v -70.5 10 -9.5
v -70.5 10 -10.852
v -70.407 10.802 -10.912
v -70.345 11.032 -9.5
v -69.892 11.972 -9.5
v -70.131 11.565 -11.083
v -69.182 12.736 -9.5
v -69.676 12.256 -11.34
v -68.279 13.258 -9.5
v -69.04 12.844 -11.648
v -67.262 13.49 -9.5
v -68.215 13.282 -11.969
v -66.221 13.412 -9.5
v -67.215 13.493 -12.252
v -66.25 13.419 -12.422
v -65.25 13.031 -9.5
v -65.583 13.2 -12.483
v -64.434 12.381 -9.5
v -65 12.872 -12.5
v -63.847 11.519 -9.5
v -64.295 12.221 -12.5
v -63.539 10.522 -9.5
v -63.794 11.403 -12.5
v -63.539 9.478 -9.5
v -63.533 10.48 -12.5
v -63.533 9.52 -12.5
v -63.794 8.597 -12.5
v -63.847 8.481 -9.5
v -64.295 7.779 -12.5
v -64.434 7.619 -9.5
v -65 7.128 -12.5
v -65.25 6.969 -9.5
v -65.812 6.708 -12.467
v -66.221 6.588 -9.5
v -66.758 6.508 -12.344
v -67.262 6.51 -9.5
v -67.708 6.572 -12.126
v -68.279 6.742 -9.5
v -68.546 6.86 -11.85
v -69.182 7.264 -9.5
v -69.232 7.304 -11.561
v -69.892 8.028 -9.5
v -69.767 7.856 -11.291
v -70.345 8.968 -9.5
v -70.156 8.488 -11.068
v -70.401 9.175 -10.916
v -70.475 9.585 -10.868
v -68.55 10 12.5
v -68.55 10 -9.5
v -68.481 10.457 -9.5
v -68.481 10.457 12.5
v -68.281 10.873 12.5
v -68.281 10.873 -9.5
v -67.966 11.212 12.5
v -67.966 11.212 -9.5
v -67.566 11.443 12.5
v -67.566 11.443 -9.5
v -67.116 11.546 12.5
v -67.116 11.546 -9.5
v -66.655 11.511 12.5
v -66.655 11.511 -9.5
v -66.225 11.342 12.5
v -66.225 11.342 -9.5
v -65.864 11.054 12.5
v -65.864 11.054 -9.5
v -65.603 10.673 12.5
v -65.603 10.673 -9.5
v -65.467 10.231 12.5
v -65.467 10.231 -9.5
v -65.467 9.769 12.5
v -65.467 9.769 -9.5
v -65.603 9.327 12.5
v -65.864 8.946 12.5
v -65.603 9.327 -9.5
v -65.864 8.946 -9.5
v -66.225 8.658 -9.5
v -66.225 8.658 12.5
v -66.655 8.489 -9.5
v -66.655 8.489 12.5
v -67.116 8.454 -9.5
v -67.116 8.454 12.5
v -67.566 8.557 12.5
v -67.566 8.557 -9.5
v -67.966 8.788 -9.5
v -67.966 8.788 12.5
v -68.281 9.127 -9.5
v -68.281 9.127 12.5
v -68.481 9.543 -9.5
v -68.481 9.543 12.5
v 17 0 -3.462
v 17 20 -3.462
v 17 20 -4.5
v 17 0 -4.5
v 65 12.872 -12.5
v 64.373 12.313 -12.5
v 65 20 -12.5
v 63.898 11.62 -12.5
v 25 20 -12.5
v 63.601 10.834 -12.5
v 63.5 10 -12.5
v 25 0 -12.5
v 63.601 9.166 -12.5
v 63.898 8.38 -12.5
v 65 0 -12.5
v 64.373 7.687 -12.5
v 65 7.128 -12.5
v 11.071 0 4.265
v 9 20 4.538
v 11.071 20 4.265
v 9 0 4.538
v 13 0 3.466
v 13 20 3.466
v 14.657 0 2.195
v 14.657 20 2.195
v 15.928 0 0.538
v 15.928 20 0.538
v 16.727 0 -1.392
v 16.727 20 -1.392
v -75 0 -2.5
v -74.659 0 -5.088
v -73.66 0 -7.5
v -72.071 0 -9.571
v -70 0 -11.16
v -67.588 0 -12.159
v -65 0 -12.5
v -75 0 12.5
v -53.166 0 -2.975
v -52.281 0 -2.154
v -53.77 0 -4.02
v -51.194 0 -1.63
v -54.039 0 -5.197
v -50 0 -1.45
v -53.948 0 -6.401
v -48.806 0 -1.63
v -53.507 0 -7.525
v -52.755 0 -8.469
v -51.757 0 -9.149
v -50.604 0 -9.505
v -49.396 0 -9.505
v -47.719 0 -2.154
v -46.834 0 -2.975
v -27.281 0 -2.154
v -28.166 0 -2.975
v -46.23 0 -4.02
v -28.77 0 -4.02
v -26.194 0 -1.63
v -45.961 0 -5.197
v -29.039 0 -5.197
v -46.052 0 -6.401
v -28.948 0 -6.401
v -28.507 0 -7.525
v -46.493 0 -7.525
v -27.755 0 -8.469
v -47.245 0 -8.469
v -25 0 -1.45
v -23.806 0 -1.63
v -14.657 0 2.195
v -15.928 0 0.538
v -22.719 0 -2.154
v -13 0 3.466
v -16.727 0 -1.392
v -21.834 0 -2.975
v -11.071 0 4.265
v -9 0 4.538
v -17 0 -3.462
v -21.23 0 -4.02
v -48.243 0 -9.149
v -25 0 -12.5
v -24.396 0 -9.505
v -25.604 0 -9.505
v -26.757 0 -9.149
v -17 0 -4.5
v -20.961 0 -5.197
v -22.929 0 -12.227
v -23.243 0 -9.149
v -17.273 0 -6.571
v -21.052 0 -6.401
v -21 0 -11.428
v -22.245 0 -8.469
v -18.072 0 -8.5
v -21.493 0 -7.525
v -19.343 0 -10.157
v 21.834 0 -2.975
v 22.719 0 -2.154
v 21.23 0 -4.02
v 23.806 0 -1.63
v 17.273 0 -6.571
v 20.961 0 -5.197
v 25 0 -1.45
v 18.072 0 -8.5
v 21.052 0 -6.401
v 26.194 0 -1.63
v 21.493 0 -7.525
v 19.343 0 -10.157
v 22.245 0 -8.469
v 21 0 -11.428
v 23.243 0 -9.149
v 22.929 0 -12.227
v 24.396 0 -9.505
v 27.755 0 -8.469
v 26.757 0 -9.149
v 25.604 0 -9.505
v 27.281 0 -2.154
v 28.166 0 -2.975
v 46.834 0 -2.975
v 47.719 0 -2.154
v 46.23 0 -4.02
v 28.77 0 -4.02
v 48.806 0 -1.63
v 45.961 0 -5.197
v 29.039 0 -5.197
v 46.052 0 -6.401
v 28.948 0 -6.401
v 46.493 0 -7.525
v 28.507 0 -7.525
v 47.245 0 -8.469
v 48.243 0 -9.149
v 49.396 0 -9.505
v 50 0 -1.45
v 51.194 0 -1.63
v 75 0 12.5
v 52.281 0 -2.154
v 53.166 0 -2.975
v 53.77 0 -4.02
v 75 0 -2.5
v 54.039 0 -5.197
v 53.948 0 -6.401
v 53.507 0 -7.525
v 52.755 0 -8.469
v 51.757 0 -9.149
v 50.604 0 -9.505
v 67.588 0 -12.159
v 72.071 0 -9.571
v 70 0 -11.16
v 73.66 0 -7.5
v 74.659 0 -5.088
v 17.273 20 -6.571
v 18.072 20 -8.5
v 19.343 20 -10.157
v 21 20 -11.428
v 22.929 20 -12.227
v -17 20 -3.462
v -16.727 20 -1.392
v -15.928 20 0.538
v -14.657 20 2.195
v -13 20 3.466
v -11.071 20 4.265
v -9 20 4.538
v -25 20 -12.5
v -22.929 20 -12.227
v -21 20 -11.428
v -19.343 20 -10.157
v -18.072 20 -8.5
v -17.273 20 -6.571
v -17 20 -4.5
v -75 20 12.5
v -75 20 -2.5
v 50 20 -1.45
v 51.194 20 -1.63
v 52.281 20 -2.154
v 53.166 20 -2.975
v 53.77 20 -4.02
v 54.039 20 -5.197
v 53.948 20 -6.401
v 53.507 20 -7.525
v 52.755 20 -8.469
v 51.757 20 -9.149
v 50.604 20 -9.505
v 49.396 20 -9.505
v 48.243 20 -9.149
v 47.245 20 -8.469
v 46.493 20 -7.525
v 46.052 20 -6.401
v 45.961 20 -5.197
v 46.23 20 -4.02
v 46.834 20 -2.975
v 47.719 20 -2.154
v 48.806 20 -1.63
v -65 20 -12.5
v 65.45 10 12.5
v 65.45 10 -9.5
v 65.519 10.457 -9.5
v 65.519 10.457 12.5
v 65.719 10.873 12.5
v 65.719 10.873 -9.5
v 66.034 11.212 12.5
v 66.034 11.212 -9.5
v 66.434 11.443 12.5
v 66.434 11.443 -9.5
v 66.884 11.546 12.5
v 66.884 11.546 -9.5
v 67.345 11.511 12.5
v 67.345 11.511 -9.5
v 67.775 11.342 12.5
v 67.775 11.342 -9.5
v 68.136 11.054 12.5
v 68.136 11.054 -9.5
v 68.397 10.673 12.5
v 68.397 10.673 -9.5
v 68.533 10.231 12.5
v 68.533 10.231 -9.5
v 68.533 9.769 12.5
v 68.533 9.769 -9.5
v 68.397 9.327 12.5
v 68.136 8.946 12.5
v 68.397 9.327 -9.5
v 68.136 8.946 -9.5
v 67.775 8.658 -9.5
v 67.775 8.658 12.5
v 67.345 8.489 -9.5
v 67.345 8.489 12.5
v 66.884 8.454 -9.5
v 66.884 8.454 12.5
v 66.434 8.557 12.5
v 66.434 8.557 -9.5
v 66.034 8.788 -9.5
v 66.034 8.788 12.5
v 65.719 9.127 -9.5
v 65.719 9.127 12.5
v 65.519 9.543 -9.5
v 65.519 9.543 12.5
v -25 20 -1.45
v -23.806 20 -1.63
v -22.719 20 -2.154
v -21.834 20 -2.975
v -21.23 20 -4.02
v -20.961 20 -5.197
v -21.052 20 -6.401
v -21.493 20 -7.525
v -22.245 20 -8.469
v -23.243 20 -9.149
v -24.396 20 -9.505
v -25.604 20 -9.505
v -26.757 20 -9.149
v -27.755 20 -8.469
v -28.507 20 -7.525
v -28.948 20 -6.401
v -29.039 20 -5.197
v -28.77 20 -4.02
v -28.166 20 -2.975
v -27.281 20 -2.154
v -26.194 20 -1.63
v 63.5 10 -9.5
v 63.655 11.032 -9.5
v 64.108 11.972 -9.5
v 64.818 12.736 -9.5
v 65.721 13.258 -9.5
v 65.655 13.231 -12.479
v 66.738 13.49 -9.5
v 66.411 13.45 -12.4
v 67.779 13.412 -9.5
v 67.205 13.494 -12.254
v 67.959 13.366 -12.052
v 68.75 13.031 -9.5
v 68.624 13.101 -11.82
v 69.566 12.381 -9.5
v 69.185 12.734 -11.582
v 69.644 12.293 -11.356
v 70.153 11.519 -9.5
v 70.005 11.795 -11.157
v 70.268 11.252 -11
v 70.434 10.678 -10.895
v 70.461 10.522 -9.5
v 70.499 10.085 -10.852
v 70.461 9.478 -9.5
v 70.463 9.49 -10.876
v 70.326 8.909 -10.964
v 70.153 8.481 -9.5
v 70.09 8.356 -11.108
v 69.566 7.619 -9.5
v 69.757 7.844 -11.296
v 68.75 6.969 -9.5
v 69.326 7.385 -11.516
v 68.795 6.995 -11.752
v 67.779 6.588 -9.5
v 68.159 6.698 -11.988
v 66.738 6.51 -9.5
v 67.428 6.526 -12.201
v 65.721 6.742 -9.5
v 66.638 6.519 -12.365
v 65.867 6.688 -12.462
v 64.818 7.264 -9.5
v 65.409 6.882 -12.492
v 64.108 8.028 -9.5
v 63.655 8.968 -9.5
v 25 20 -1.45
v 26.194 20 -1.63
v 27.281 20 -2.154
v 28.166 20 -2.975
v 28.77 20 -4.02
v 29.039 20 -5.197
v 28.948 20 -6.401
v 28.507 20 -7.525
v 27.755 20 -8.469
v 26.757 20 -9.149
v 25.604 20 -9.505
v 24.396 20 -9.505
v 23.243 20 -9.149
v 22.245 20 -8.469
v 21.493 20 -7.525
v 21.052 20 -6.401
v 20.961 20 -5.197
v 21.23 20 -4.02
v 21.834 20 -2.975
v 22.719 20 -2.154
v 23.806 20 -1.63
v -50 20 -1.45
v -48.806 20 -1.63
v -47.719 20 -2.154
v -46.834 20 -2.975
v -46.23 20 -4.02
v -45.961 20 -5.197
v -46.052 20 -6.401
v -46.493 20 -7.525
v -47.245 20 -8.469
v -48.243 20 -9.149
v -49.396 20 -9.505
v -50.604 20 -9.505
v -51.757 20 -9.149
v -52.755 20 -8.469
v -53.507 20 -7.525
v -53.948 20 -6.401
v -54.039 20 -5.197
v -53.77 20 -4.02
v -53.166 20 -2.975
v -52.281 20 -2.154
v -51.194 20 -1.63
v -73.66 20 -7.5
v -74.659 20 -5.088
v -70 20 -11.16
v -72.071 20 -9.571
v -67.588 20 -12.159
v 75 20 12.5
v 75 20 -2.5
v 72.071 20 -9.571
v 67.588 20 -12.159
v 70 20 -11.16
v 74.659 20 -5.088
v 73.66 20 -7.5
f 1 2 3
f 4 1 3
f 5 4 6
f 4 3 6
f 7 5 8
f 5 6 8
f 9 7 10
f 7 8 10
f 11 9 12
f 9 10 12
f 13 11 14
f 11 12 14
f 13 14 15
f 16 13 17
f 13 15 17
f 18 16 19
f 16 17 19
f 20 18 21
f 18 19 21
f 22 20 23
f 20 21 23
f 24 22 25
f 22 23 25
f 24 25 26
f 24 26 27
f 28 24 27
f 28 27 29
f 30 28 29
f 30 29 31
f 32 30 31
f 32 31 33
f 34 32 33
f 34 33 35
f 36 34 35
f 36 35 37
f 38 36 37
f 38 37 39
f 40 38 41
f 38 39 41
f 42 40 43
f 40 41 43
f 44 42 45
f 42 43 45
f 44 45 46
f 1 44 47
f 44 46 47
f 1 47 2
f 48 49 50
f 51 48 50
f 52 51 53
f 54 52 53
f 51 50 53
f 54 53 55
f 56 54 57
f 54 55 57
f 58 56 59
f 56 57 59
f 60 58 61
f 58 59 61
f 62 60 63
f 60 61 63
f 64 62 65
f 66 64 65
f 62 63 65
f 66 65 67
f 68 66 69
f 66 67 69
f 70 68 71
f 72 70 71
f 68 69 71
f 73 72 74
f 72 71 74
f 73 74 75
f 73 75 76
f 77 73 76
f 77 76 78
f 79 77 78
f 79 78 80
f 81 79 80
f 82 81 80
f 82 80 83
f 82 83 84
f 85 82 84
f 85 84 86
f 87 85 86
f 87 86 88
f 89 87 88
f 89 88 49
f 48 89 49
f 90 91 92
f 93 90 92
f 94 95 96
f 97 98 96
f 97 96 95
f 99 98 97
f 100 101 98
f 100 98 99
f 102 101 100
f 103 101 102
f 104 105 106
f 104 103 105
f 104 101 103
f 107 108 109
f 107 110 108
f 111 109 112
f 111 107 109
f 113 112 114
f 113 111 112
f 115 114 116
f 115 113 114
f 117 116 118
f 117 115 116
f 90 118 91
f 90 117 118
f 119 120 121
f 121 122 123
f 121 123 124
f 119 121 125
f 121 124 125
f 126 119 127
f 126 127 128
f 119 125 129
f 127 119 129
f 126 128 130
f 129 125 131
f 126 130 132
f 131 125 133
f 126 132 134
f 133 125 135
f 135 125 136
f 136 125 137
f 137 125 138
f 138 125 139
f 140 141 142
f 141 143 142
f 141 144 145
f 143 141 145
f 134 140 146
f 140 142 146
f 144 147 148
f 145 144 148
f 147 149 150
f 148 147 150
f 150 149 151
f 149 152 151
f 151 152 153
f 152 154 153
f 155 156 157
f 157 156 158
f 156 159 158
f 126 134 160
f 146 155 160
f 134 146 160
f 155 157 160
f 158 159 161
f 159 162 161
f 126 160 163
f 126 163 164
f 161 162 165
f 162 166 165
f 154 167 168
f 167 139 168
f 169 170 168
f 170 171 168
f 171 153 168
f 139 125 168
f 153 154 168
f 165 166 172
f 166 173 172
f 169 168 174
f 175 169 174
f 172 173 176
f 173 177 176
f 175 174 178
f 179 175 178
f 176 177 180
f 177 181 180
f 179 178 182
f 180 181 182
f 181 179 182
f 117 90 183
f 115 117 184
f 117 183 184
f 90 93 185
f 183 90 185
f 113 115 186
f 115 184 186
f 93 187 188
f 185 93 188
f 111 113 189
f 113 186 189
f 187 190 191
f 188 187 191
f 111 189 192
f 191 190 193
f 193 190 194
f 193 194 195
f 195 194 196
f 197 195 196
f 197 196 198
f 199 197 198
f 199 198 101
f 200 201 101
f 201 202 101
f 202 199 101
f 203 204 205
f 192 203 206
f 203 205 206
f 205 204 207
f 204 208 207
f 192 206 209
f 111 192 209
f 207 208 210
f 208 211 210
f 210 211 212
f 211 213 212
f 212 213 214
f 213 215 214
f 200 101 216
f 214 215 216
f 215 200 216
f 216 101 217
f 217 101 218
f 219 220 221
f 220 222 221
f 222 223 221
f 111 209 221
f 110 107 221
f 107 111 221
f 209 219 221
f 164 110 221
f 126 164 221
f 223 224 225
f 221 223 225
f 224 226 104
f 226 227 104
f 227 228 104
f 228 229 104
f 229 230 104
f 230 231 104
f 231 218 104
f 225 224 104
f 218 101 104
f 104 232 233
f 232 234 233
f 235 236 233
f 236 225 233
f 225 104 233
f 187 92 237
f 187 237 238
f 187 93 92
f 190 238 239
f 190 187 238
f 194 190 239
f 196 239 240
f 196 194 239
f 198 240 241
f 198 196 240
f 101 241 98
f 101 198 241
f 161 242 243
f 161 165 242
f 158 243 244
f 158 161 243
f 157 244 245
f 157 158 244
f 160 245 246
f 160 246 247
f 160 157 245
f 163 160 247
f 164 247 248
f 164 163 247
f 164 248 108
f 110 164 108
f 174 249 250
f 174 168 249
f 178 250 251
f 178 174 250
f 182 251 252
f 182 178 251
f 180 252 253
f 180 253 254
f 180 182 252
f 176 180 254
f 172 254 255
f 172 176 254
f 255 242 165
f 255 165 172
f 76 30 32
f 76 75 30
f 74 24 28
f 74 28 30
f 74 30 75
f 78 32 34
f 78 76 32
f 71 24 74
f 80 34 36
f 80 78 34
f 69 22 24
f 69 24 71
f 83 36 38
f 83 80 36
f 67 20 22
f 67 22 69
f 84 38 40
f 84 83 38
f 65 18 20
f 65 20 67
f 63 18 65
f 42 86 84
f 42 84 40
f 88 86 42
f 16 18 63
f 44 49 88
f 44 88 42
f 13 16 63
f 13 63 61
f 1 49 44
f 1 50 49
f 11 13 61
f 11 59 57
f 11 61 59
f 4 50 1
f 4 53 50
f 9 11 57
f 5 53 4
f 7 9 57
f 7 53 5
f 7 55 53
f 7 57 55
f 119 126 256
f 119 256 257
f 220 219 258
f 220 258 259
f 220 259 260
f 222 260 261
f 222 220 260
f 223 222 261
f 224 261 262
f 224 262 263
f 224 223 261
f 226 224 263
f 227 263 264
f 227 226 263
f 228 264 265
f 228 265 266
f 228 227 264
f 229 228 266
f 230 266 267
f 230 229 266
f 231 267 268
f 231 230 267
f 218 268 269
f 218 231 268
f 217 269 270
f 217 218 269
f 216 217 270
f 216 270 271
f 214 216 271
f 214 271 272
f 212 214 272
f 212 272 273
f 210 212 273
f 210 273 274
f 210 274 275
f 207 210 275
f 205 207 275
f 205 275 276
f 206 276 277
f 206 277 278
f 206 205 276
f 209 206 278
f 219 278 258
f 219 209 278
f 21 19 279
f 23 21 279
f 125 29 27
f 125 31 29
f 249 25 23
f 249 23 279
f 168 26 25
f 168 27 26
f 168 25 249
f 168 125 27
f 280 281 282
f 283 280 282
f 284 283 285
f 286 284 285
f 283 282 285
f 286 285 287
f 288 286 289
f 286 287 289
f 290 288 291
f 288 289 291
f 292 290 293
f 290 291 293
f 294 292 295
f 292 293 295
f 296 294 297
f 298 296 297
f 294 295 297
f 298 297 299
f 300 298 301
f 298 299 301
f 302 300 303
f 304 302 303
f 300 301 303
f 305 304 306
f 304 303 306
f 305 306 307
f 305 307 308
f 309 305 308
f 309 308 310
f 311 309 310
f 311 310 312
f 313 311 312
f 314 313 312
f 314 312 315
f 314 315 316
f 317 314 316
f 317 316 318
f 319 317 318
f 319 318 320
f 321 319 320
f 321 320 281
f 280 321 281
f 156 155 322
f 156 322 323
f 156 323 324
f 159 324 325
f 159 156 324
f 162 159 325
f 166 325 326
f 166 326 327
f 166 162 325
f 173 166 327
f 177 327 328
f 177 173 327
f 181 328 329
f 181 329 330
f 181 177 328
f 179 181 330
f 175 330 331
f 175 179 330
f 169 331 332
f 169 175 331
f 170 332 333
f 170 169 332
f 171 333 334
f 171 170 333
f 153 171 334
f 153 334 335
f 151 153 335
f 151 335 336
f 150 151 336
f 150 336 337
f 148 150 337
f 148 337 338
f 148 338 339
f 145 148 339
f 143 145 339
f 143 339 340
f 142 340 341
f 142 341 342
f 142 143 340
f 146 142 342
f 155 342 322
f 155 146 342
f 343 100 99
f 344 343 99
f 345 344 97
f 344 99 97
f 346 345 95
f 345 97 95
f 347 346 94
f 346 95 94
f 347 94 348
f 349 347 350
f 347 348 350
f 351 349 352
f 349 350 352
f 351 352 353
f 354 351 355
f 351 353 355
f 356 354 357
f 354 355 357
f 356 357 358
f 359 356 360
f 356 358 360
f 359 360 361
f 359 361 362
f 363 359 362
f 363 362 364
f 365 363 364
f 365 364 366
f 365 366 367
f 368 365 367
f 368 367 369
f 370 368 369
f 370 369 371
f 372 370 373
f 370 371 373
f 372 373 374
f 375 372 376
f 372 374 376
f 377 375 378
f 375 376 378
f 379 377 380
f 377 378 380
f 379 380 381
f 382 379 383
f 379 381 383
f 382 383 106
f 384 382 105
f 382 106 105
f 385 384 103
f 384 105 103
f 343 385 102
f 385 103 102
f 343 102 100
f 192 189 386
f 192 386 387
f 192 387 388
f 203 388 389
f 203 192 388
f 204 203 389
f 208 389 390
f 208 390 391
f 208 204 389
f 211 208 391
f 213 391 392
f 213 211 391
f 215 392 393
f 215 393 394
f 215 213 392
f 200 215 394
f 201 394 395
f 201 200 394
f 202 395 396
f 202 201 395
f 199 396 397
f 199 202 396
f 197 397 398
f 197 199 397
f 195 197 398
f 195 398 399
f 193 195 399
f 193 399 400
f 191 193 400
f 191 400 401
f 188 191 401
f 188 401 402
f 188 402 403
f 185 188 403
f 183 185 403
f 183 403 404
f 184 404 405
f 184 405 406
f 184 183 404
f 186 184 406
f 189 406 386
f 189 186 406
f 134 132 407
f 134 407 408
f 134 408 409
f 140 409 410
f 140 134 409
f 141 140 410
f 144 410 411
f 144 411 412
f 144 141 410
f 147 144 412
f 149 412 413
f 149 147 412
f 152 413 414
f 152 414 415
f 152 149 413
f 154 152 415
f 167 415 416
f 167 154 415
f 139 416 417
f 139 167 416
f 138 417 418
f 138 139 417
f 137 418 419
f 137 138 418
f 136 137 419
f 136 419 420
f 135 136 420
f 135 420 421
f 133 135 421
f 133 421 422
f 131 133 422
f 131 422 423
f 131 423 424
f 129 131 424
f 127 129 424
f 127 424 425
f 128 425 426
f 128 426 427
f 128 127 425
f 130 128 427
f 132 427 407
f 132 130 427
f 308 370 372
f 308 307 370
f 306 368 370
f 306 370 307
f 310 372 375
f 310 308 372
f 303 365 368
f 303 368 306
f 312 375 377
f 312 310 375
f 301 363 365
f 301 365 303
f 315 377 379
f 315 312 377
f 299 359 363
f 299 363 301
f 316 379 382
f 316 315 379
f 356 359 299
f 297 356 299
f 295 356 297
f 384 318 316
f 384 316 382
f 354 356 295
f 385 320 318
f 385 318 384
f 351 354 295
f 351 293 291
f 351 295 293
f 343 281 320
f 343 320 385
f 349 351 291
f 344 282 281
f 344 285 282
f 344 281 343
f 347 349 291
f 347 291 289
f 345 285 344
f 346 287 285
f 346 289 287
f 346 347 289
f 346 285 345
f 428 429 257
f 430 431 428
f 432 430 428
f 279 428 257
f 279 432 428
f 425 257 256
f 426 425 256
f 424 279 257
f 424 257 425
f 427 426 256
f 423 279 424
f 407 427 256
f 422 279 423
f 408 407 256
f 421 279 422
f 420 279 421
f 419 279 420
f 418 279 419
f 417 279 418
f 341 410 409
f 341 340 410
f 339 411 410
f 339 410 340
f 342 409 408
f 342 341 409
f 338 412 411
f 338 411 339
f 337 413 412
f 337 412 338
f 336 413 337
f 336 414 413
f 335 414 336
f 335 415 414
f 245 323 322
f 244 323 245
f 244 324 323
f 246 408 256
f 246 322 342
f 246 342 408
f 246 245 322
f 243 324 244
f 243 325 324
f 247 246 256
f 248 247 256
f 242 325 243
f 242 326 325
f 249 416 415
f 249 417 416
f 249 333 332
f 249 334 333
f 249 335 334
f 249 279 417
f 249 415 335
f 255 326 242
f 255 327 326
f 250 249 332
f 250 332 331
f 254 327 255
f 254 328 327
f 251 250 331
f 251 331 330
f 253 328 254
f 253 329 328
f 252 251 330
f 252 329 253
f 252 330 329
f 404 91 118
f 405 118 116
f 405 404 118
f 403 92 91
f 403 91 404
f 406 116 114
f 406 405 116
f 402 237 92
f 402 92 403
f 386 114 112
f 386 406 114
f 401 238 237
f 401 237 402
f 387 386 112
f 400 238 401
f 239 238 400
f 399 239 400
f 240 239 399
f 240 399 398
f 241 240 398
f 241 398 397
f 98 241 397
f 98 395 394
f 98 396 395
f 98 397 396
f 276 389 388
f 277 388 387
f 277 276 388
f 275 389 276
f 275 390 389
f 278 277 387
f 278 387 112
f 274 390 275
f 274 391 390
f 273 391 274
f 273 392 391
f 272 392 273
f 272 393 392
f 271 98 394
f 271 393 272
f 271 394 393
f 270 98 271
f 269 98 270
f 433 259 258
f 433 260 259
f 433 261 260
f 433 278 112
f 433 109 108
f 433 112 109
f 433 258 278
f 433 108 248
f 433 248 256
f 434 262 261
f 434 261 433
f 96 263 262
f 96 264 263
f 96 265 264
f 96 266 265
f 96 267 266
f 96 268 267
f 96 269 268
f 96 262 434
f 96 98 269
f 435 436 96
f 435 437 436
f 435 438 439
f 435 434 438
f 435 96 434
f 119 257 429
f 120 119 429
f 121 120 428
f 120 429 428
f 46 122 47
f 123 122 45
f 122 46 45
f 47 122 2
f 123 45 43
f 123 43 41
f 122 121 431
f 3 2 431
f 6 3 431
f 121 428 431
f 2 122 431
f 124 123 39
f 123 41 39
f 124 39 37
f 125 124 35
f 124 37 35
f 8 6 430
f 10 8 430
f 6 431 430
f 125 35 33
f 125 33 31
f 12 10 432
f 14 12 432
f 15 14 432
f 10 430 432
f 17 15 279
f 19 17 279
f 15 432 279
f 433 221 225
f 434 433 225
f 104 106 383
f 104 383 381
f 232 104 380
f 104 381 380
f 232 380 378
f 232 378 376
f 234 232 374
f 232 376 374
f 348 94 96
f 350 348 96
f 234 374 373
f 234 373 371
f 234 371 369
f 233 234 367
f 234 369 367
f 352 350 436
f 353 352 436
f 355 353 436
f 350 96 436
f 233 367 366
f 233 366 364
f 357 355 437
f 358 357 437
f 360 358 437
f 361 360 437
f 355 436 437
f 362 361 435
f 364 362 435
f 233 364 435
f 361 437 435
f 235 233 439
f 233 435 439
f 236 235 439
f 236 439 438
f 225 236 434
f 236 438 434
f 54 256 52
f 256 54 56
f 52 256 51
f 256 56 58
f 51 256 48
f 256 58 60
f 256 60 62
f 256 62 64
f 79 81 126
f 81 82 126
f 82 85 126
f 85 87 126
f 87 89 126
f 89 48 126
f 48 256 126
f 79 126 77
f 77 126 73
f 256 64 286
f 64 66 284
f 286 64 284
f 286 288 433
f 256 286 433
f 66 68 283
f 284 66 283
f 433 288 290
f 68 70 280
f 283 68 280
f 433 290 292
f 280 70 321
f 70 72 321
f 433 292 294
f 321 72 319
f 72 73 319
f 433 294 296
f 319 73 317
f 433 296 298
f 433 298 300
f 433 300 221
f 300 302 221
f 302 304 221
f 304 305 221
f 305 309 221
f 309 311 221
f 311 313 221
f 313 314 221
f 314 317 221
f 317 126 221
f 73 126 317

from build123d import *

# Parameters (mm, degrees)
SKETCH1_W           = 150
SKETCH1_H           = 25
SKETCH1_R           = 4.05
BOSS_EXTRUDE1_DEPTH = 20
FILLET1_R           = 10
SKETCH3_R           = 1.55
CUT_EXTRUDE1_DEPTH  = 26
SKETCH3_3_R         = 3.5
SKETCH3_3_R_2       = 1.55
CUT_EXTRUDE2_DEPTH  = 3
SKETCH4_W           = 34
SKETCH4_H           = 34.075617562
CUT_EXTRUDE3_DEPTH  = 21.0000001
FILLET2_R           = 8


with BuildPart() as part:
    # Sketch1 → Boss-Extrude1 (new body)
    with BuildSketch(Plane(origin=(0, 0, 0), x_dir=(1, 0, 0), z_dir=(0, 1, 0))):
        Rectangle(SKETCH1_W, SKETCH1_H)
        with Locations(Location((-25, 5.5, 0), (0, 0, 270))):  # turned: the seam where the file's is
            Circle(SKETCH1_R, mode=Mode.SUBTRACT)
        with Locations(Location((25, 5.5, 0), (0, 0, 270))):  # turned: the seam where the file's is
            Circle(SKETCH1_R, mode=Mode.SUBTRACT)
        with Locations(Location((-50, 5.5, 0), (0, 0, 270))):  # turned: the seam where the file's is
            Circle(SKETCH1_R, mode=Mode.SUBTRACT)
        with Locations(Location((50, 5.5, 0), (0, 0, 270))):  # turned: the seam where the file's is
            Circle(SKETCH1_R, mode=Mode.SUBTRACT)
    extrude(amount=BOSS_EXTRUDE1_DEPTH)

    # Fillet1
    fillet1_edges = [part.edges().sort_by_distance(p)[0] for p in [
        (-75, 10, -12.5),
        (75, 10, -12.5),
    ]]
    fillet(fillet1_edges, radius=FILLET1_R)

    # Sketch3 → Cut-Extrude1 (cut, through all)
    with BuildSketch(Plane(origin=(0, 0, -12.5), x_dir=(-1, 0, 0), z_dir=(0, 0, -1))):
        with Locations((-67, 10)):
            Circle(SKETCH3_R)
        with Locations((67, 10)):
            Circle(SKETCH3_R)
    extrude(amount=-CUT_EXTRUDE1_DEPTH, mode=Mode.SUBTRACT)

    # Sketch3_3 → Cut-Extrude2 (cut)
    with BuildSketch(Plane(origin=(0, 0, -12.5), x_dir=(-1, 0, 0), z_dir=(0, 0, -1))):
        with Locations((-67, 10)):
            Circle(SKETCH3_3_R)
        with Locations((-67, 10)):
            Circle(SKETCH3_3_R_2, mode=Mode.SUBTRACT)
        with Locations((67, 10)):
            Circle(SKETCH3_3_R)
        with Locations((67, 10)):
            Circle(SKETCH3_3_R_2, mode=Mode.SUBTRACT)
    extrude(amount=-CUT_EXTRUDE2_DEPTH, mode=Mode.SUBTRACT)

    # Sketch4 → Cut-Extrude3 (cut, through all)
    with BuildSketch(Plane(origin=(0, 20, 0), x_dir=(1, 0, 0), z_dir=(0, 1, 0))):
        with Locations((0, 12.5)):
            Rectangle(SKETCH4_W, SKETCH4_H)
    extrude(amount=-CUT_EXTRUDE3_DEPTH, mode=Mode.SUBTRACT)

    # Fillet2
    fillet2_edges = [part.edges().sort_by_distance(p)[0] for p in [
        (-17, 10, -12.5),
        (17, 10, -12.5),
        (-17, 10, 4.537808781),
        (17, 10, 4.537808781),
    ]]
    fillet(fillet2_edges, radius=FILLET2_R)


solid = part.part
